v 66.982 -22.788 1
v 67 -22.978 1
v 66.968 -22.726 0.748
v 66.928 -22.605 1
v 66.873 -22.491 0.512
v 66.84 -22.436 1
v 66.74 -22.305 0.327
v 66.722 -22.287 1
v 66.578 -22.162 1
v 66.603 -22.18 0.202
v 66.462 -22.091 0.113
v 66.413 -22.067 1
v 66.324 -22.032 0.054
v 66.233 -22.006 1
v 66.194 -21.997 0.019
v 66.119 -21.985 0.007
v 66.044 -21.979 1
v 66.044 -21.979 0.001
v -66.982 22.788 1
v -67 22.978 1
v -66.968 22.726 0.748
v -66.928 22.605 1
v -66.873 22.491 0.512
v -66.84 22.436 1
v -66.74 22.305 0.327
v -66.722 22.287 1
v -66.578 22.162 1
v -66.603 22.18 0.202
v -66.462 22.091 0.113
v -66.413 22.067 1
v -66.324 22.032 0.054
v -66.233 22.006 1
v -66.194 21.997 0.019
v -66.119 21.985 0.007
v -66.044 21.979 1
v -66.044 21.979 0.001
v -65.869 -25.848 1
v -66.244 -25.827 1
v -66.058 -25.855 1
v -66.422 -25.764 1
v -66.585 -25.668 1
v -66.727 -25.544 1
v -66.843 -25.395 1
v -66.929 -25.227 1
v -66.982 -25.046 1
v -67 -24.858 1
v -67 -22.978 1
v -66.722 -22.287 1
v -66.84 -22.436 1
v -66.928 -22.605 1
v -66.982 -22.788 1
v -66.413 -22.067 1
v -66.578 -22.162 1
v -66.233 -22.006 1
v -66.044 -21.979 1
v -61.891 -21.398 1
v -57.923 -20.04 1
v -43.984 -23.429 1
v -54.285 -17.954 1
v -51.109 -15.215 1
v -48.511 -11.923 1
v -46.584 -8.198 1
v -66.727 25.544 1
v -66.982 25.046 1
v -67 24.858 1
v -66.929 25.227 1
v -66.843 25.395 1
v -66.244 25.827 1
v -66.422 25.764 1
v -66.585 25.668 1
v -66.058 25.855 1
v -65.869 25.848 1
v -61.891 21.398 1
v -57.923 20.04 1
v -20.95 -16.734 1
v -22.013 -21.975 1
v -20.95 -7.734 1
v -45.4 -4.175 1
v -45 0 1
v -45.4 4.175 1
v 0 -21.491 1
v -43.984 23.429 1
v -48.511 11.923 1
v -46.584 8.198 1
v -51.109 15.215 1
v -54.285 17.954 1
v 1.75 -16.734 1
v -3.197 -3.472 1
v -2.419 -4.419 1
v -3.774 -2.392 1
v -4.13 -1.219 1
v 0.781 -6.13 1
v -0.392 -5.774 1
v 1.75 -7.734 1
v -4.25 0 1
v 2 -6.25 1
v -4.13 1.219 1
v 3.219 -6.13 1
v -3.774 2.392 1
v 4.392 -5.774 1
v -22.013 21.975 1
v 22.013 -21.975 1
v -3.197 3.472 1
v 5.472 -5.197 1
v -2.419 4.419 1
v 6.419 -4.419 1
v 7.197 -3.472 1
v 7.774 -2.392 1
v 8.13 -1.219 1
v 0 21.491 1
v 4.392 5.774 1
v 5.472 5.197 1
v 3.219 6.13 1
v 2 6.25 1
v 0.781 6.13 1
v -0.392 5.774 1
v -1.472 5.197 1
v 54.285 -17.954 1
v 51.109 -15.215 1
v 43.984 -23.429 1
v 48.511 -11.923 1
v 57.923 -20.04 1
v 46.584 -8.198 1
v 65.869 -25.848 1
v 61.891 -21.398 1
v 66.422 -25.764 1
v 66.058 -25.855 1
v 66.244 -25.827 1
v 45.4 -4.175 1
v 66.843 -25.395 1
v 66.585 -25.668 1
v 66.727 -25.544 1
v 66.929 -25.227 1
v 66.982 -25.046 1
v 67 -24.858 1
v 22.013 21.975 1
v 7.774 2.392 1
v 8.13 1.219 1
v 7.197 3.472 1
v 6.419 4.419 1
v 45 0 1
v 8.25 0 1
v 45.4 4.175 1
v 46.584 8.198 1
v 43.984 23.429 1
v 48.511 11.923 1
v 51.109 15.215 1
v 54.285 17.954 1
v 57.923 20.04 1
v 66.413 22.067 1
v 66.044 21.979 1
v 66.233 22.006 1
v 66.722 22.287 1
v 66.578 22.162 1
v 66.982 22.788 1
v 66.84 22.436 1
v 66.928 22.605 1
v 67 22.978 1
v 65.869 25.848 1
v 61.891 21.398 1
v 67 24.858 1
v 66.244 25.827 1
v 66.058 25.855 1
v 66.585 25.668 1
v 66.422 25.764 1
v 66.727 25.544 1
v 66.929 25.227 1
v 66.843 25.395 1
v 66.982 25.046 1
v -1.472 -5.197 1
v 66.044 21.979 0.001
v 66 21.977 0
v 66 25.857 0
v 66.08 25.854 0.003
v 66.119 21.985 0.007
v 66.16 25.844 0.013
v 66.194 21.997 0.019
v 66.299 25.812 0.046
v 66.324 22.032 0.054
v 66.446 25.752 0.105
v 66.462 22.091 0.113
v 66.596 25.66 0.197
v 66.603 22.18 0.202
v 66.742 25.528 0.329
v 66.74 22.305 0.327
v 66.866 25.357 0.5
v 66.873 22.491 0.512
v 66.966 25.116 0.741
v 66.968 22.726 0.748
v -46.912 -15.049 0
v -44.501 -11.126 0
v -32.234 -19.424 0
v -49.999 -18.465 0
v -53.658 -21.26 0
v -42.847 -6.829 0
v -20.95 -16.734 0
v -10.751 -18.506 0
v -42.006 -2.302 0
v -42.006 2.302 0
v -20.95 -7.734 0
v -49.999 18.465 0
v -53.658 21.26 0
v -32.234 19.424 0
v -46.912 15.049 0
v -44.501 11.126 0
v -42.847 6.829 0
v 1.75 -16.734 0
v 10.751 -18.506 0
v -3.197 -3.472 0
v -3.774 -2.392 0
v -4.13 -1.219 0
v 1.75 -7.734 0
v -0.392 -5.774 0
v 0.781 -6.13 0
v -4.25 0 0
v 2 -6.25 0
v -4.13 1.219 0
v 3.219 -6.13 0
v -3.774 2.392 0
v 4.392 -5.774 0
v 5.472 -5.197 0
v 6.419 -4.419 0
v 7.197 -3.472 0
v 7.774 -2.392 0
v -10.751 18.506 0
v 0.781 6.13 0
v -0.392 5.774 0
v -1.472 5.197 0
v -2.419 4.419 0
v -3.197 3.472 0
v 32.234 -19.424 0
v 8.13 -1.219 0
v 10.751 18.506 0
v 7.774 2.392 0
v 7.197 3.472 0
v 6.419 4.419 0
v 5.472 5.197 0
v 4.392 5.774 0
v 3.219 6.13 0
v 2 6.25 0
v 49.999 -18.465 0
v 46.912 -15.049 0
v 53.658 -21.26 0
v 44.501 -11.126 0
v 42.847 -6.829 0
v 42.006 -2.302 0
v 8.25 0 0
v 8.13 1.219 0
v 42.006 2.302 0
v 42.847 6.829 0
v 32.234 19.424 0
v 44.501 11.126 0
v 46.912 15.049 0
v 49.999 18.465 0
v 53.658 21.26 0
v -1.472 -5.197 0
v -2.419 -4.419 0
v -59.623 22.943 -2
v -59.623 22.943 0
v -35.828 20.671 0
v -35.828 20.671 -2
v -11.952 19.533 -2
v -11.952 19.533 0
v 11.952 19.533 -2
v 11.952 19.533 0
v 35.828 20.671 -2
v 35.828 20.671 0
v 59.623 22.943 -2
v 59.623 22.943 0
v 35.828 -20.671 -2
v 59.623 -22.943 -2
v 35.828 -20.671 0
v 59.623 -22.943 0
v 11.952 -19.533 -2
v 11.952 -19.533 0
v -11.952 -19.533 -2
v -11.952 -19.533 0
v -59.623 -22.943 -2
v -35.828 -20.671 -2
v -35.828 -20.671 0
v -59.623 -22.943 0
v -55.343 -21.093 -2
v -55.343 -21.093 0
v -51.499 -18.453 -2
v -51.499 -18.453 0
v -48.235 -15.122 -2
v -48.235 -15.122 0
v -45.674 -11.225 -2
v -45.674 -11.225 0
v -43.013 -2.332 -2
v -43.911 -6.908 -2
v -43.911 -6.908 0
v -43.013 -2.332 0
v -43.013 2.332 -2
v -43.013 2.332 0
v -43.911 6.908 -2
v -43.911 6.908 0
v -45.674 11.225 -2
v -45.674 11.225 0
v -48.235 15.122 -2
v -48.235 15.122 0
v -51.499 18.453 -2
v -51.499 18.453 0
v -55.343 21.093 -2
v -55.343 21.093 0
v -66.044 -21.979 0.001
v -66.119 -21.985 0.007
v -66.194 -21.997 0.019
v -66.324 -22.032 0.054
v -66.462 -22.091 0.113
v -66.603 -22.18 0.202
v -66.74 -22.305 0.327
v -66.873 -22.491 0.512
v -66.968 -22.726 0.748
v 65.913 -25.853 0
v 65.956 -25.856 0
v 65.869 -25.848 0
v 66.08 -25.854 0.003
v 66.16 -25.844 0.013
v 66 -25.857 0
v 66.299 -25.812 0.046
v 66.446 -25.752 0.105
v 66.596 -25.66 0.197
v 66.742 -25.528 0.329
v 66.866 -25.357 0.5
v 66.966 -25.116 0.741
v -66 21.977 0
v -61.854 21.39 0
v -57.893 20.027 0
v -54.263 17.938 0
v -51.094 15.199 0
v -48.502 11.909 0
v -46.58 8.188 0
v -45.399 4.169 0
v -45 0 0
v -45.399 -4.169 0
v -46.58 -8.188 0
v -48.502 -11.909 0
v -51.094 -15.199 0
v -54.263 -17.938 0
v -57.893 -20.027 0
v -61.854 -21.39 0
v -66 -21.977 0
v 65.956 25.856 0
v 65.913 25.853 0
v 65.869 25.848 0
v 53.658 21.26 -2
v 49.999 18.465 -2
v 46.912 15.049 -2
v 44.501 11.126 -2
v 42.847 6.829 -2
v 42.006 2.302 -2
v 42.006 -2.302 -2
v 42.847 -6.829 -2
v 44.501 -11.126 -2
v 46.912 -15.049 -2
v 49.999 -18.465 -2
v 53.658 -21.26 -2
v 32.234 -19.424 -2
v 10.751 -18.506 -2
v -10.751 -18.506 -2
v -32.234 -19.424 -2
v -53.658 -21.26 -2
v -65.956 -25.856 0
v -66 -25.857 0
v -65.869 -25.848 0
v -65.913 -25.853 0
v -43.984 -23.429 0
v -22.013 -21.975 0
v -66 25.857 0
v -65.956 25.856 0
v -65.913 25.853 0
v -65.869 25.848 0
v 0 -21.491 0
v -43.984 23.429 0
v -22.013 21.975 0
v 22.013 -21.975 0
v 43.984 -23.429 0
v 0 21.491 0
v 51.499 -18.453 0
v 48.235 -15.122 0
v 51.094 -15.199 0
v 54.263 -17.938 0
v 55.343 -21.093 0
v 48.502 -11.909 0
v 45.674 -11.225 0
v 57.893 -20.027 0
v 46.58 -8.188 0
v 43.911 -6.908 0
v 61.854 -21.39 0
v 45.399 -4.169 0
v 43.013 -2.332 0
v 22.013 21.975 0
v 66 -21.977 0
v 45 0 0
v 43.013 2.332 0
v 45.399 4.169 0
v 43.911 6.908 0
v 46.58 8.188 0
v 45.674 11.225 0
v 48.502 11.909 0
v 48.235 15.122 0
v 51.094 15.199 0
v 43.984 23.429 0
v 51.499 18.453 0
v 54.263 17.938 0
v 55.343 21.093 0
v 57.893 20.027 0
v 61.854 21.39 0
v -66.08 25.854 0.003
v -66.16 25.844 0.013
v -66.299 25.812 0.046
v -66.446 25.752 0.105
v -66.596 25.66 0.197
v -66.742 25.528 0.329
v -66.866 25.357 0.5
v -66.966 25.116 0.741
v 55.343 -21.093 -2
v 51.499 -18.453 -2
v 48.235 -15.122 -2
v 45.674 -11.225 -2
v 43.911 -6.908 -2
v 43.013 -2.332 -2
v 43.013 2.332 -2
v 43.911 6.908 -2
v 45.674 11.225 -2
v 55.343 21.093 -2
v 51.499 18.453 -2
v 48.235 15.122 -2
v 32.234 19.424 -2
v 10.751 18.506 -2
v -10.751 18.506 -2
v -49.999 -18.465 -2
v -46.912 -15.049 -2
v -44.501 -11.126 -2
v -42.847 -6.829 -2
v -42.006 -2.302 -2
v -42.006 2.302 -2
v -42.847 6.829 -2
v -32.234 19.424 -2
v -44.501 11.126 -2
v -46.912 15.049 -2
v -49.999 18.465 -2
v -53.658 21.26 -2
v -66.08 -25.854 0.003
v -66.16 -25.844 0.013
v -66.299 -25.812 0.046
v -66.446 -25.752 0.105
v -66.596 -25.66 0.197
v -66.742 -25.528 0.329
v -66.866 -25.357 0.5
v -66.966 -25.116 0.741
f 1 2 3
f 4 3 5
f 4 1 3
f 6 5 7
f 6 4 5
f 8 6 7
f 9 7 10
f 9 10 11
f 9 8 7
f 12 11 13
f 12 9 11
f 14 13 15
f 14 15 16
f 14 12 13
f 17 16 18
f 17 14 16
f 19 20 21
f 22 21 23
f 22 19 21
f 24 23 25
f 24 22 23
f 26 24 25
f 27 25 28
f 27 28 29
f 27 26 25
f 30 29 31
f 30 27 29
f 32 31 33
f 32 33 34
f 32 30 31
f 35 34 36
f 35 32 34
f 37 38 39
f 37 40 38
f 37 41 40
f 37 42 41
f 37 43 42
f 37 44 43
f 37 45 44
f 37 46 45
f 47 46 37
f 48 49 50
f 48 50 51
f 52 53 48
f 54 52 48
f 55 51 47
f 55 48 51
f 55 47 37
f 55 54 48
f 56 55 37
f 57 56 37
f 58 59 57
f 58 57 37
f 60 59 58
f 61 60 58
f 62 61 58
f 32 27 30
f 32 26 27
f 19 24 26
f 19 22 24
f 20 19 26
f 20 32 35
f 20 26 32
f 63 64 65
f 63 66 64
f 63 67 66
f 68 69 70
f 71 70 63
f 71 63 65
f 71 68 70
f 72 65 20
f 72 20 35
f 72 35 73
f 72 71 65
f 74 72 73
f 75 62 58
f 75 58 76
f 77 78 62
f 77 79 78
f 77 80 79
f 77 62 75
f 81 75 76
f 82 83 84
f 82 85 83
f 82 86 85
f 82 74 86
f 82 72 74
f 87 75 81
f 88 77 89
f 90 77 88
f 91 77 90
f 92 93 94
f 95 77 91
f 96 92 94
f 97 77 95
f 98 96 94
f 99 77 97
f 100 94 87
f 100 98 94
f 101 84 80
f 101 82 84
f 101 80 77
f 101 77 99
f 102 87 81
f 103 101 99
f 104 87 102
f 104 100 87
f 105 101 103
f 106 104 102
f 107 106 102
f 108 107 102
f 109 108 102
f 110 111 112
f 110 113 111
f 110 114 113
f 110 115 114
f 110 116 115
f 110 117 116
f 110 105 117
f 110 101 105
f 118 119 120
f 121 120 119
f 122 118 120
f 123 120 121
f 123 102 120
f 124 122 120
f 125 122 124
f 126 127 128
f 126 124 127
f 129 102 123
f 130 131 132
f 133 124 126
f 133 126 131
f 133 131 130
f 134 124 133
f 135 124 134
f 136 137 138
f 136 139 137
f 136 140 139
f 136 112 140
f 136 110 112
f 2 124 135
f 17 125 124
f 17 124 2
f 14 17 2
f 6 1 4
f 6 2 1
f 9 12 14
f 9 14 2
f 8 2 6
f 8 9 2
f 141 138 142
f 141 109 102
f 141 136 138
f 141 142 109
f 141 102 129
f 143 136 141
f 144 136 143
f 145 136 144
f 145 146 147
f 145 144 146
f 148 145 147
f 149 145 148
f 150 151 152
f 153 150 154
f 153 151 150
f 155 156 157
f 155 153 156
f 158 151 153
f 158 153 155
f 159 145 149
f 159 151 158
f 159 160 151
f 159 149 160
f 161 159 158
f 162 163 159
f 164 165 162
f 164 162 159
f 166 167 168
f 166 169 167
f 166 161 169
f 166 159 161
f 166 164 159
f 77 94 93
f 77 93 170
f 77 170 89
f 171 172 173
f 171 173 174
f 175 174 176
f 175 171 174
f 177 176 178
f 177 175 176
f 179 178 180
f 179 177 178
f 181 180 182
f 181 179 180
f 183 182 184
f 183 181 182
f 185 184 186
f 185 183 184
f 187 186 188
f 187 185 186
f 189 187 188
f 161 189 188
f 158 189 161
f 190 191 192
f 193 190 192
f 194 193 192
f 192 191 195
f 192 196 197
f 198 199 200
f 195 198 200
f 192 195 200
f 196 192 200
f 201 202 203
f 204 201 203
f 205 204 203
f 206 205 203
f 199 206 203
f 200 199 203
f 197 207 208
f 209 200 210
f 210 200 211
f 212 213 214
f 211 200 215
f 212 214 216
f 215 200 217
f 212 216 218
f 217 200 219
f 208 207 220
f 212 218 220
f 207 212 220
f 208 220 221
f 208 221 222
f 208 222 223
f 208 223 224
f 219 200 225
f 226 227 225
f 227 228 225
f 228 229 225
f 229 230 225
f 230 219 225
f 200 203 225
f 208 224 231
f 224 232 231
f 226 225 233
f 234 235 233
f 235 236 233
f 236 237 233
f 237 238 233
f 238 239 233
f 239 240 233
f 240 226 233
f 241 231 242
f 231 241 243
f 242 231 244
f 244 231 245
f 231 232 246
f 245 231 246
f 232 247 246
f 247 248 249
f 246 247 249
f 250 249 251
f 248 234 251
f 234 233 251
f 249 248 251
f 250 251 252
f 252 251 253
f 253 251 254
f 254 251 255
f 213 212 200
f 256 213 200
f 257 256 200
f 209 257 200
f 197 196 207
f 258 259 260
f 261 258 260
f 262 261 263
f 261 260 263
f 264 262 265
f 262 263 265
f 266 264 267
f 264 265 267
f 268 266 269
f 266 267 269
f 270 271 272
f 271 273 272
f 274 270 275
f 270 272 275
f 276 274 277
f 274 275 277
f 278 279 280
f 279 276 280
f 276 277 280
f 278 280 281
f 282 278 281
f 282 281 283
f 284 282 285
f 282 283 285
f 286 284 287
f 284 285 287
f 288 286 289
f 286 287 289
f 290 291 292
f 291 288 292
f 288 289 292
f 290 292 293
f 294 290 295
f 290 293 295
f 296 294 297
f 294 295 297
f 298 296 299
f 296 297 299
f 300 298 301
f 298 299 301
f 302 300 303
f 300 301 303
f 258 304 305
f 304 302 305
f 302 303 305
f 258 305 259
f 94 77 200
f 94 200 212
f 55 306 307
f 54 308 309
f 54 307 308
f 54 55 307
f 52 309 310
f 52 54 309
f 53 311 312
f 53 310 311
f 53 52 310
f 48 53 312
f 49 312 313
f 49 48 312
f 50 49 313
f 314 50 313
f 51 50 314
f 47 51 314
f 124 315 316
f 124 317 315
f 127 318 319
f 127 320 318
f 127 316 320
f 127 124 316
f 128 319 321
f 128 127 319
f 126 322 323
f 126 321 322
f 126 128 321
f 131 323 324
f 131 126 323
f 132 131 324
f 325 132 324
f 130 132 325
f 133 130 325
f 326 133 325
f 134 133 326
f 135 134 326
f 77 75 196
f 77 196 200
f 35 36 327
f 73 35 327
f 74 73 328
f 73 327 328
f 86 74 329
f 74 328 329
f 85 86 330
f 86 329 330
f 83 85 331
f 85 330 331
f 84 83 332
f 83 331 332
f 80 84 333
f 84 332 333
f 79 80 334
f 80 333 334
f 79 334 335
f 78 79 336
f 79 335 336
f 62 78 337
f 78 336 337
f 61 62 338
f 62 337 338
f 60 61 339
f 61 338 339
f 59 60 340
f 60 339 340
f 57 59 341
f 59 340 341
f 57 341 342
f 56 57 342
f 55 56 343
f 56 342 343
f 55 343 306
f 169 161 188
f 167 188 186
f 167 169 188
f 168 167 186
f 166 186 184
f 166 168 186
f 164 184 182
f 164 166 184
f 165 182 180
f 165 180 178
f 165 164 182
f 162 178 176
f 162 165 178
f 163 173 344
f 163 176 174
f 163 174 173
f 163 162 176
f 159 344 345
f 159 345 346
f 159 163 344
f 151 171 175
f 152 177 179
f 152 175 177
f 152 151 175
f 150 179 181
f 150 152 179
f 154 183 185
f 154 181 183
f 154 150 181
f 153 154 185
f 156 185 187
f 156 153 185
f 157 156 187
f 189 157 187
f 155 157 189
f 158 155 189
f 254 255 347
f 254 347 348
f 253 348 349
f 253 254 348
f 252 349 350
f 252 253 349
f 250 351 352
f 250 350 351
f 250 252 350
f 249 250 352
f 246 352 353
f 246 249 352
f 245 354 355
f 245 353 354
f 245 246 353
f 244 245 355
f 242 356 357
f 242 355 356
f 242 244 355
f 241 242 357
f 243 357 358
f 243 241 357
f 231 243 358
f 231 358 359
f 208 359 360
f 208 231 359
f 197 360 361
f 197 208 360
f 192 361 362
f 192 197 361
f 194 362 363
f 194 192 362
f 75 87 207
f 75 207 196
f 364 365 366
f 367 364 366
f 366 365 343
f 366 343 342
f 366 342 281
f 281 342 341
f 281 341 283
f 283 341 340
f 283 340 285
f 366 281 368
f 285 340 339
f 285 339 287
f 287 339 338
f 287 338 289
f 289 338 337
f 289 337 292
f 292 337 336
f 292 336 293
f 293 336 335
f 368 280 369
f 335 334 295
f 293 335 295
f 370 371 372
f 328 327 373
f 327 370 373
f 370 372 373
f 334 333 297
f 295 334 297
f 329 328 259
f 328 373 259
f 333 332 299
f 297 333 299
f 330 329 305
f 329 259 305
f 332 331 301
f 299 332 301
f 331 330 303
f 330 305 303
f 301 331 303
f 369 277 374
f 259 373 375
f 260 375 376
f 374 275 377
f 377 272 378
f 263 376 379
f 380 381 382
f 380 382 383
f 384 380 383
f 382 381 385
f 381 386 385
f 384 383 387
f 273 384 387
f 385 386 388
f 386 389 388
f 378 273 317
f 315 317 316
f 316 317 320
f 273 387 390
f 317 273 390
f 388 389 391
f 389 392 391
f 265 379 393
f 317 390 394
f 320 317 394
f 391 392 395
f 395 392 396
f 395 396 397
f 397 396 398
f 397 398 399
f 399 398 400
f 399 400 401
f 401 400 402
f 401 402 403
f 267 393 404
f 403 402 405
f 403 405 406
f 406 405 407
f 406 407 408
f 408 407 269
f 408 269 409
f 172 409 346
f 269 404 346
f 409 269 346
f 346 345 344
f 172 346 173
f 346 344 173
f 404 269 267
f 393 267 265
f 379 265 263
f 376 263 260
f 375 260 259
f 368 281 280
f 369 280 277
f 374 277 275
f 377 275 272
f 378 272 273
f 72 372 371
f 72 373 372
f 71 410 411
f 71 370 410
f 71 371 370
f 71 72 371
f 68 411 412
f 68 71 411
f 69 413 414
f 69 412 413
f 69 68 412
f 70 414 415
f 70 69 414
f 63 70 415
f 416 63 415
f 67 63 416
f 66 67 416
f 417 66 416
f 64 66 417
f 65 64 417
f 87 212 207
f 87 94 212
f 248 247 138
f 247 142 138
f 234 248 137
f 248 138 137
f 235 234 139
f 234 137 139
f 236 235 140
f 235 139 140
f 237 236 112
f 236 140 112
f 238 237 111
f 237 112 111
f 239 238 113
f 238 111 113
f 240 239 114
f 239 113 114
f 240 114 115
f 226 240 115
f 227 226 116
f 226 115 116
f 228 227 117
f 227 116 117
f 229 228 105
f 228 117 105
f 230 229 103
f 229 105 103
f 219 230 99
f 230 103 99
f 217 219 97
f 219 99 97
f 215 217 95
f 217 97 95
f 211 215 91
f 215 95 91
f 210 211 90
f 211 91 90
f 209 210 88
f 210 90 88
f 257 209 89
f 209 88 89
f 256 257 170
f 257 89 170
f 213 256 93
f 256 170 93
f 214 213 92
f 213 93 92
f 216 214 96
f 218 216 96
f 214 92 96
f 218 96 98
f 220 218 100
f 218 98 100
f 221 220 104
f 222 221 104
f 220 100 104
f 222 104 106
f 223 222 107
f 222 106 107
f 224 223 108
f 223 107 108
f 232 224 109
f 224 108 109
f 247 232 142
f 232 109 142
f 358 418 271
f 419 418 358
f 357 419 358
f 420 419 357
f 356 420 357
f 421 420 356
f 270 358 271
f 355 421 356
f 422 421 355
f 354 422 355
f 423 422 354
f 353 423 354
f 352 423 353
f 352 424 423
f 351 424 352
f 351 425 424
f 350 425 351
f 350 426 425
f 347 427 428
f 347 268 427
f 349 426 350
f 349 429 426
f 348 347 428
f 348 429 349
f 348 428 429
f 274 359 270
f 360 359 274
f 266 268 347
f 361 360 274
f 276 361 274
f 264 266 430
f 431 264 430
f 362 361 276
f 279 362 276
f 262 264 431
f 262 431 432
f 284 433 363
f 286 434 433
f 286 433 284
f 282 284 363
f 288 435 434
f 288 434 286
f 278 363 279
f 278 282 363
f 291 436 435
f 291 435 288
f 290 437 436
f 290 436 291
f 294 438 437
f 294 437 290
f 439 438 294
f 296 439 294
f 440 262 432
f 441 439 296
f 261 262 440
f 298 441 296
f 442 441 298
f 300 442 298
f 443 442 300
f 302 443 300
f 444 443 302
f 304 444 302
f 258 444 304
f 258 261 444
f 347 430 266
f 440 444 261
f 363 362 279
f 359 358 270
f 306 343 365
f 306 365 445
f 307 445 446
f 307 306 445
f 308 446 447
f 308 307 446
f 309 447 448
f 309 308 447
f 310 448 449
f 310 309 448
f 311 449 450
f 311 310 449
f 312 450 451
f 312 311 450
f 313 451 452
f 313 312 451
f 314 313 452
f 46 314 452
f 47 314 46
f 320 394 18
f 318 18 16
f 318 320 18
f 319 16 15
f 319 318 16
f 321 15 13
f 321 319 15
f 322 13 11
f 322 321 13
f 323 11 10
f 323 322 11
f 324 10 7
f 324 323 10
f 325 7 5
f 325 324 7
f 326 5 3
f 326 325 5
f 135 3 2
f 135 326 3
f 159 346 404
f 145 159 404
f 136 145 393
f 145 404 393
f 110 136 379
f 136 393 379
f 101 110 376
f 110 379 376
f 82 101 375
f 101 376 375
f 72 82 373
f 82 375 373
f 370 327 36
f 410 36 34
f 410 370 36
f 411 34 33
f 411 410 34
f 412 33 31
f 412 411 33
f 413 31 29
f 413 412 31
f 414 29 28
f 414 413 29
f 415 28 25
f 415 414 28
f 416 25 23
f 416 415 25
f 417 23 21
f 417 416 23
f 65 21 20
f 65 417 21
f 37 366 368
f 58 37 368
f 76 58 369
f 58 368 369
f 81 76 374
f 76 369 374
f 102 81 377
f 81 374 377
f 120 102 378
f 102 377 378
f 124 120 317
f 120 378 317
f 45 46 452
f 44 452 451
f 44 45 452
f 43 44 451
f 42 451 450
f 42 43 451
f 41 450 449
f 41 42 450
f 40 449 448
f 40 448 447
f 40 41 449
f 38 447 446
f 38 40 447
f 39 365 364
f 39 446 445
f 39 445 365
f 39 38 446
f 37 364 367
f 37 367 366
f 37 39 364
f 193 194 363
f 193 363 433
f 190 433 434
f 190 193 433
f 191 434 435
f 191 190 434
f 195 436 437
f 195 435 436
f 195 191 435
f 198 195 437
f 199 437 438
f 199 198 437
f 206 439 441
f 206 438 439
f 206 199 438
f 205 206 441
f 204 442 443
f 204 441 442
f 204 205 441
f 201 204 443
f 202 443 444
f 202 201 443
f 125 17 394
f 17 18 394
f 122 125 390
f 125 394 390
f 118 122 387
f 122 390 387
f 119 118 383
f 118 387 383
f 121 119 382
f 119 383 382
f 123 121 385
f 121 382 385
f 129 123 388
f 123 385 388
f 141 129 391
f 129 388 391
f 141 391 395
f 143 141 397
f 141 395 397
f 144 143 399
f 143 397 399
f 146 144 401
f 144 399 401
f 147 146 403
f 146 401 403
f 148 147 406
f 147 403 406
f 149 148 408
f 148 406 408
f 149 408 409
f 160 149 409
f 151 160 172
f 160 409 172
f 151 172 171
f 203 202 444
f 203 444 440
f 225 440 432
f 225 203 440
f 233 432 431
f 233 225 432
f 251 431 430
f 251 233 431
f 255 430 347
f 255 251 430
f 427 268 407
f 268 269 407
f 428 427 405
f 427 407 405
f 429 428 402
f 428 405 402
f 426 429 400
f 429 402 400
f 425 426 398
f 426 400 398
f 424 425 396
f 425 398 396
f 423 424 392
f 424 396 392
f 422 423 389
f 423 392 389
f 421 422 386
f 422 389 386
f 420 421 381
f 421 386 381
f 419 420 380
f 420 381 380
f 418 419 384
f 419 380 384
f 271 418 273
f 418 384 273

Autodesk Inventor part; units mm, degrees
ref_plane "YZ Plane" through (0, 0, 0) normal (1, 0, 0) x (0, 1, 0)
ref_plane "XZ Plane" through (0, 0, 0) normal (0, 1, 0) x (-1, 0, 0)
ref_plane "XY Plane" through (0, 0, 0) normal (0, 0, 1) x (1, 0, 0)
ref_plane "Work Plane1" through (0, 0, 0) normal (0, 0, 1) x (1, 0, 0)
sketch "Sketch1" plane through (0, 0, 0) normal (0, 0, 1) x (1, 0, 0)
  arc A0 (-60.8058, -23.1869) -> (-60.8058, 23.1869) centre (-67, 0) ccw projected
  arc A1 (-60.8058, 23.1869) -> (60.8058, 23.1869) centre (0, 521.4907) ccw projected
  arc A2 (60.8058, 23.1869) -> (60.8058, -23.1869) centre (67, 0) ccw projected
  arc A3 (60.8058, -23.1869) -> (-60.8058, -23.1869) centre (0, -521.4907) ccw projected
  arc A4 (-67, -22) -> (-67, 22) centre (-67, 0) ccw projected
  line L0 (-67, -26) -> (-67, -22) projected
  arc A5 (67, -26) -> (-67, -26) centre (0, -521.4907) ccw projected
  line L1 (67, -22) -> (67, -26) projected
  arc A6 (67, 22) -> (67, -22) centre (67, 0) ccw projected
  line L2 (67, 26) -> (67, 22) projected
  arc A7 (-67, 26) -> (67, 26) centre (0, 521.4907) ccw projected
  line L3 (-67, 22) -> (-67, 26) projected
  point P0 (0, 0)
extrude "Extrusion1" add sketch "Sketch1" along normal blind 1 contours A0 A1 A2 A3 | A4 L3 A7 L2 A6 L1 A5 L0
fillet "Fillet1" radius 1 12 edges at (67, -26, 0.5) (67, -22, 0.5) (67, -24, 0) (67, 22, 0.5) (67, 26, 0.5) (67, 24, 0) (-67, -26, 0.5) (-67, -22, 0.5) (-67, -24, 0) (-67, 22, 0.5) (-67, 26, 0.5) (-67, 24, 0)
sketch "Sketch2" plane through (0, 0, 0) normal (0, 0, -1) x (-1, 0, 0)
  arc A0 (-60.8058, -23.1869) -> (-60.8058, 23.1869) centre (-67, 0) ccw projected
  arc A1 (60.8058, -23.1869) -> (-60.8058, -23.1869) centre (0, -521.4907) ccw projected
  arc A2 (-60.8058, 23.1869) -> (60.8058, 23.1869) centre (0, 521.4907) ccw projected
  arc A3 (60.8058, 23.1869) -> (60.8058, -23.1869) centre (67, 0) ccw projected
  arc A4 (-59.6234, 22.9433) -> (59.6234, 22.9433) centre (0, 521.4907) ccw
  arc A5 (-59.6234, -22.9433) -> (-59.6234, 22.9433) centre (-67, 0) ccw
  arc A6 (59.6234, -22.9433) -> (-59.6234, -22.9433) centre (0, -521.4907) ccw
  arc A7 (59.6234, 22.9433) -> (59.6234, -22.9433) centre (67, 0) ccw
  arc A8 (-53.6579, 21.2603) -> (53.6579, 21.2603) centre (0, 521.4907) ccw
  arc A9 (-53.6579, -21.2603) -> (-53.6579, 21.2603) centre (-67, 0) ccw
  arc A10 (53.6579, -21.2603) -> (-53.6579, -21.2603) centre (0, -521.4907) ccw
  arc A11 (53.6579, 21.2603) -> (53.6579, -21.2603) centre (67, 0) ccw
  point P0 (0, 0)
  dimension "d3" = 0.1
  dimension "d4" = 1
extrude "Extrusion2" add sketch "Sketch2" along normal blind 2 contours A4 A7 A6 A5
sketch "Sketch3" plane through (0, 0, 1) normal (0, 0, 1) x (1, 0, 0)
  circle A0 centre (2, 0) radius 6
  line L0 (-19.7, -8.9844) -> (0.5, -8.9844)
  line L1 (0.5, -8.9844) -> (0.5, -15.4844)
  line L2 (0.5, -15.4844) -> (-19.7, -15.4844)
  line L3 (-19.7, -15.4844) -> (-19.7, -8.9844)
  line L4 (-19.95, -15.7344) -> (0.75, -15.7344)
  line L5 (0.75, -15.7344) -> (0.75, -8.7344)
  line L6 (0.75, -8.7344) -> (-19.95, -8.7344)
  line L7 (-19.95, -8.7344) -> (-19.95, -15.7344)
  circle A1 centre (2, 0) radius 6.25
  line L8 (1.75, -16.7344) -> (-20.95, -16.7344)
  line L9 (-20.95, -16.7344) -> (-20.95, -7.7344)
  line L10 (-20.95, -7.7344) -> (1.75, -7.7344)
  line L11 (1.75, -7.7344) -> (1.75, -16.7344)
  point P0 (0, 0)
  dimension "d7" = 0.25
  dimension "d8" = 0.25
  dimension "d11" = 1
extrude "Extrusion3" cut sketch "Sketch3" against normal blind 1 contours A0 | L0 L1 L2 L3 | L7 L6 L5 L4 | A1 | L8 L9 L10 L11
properties part number "cap"
